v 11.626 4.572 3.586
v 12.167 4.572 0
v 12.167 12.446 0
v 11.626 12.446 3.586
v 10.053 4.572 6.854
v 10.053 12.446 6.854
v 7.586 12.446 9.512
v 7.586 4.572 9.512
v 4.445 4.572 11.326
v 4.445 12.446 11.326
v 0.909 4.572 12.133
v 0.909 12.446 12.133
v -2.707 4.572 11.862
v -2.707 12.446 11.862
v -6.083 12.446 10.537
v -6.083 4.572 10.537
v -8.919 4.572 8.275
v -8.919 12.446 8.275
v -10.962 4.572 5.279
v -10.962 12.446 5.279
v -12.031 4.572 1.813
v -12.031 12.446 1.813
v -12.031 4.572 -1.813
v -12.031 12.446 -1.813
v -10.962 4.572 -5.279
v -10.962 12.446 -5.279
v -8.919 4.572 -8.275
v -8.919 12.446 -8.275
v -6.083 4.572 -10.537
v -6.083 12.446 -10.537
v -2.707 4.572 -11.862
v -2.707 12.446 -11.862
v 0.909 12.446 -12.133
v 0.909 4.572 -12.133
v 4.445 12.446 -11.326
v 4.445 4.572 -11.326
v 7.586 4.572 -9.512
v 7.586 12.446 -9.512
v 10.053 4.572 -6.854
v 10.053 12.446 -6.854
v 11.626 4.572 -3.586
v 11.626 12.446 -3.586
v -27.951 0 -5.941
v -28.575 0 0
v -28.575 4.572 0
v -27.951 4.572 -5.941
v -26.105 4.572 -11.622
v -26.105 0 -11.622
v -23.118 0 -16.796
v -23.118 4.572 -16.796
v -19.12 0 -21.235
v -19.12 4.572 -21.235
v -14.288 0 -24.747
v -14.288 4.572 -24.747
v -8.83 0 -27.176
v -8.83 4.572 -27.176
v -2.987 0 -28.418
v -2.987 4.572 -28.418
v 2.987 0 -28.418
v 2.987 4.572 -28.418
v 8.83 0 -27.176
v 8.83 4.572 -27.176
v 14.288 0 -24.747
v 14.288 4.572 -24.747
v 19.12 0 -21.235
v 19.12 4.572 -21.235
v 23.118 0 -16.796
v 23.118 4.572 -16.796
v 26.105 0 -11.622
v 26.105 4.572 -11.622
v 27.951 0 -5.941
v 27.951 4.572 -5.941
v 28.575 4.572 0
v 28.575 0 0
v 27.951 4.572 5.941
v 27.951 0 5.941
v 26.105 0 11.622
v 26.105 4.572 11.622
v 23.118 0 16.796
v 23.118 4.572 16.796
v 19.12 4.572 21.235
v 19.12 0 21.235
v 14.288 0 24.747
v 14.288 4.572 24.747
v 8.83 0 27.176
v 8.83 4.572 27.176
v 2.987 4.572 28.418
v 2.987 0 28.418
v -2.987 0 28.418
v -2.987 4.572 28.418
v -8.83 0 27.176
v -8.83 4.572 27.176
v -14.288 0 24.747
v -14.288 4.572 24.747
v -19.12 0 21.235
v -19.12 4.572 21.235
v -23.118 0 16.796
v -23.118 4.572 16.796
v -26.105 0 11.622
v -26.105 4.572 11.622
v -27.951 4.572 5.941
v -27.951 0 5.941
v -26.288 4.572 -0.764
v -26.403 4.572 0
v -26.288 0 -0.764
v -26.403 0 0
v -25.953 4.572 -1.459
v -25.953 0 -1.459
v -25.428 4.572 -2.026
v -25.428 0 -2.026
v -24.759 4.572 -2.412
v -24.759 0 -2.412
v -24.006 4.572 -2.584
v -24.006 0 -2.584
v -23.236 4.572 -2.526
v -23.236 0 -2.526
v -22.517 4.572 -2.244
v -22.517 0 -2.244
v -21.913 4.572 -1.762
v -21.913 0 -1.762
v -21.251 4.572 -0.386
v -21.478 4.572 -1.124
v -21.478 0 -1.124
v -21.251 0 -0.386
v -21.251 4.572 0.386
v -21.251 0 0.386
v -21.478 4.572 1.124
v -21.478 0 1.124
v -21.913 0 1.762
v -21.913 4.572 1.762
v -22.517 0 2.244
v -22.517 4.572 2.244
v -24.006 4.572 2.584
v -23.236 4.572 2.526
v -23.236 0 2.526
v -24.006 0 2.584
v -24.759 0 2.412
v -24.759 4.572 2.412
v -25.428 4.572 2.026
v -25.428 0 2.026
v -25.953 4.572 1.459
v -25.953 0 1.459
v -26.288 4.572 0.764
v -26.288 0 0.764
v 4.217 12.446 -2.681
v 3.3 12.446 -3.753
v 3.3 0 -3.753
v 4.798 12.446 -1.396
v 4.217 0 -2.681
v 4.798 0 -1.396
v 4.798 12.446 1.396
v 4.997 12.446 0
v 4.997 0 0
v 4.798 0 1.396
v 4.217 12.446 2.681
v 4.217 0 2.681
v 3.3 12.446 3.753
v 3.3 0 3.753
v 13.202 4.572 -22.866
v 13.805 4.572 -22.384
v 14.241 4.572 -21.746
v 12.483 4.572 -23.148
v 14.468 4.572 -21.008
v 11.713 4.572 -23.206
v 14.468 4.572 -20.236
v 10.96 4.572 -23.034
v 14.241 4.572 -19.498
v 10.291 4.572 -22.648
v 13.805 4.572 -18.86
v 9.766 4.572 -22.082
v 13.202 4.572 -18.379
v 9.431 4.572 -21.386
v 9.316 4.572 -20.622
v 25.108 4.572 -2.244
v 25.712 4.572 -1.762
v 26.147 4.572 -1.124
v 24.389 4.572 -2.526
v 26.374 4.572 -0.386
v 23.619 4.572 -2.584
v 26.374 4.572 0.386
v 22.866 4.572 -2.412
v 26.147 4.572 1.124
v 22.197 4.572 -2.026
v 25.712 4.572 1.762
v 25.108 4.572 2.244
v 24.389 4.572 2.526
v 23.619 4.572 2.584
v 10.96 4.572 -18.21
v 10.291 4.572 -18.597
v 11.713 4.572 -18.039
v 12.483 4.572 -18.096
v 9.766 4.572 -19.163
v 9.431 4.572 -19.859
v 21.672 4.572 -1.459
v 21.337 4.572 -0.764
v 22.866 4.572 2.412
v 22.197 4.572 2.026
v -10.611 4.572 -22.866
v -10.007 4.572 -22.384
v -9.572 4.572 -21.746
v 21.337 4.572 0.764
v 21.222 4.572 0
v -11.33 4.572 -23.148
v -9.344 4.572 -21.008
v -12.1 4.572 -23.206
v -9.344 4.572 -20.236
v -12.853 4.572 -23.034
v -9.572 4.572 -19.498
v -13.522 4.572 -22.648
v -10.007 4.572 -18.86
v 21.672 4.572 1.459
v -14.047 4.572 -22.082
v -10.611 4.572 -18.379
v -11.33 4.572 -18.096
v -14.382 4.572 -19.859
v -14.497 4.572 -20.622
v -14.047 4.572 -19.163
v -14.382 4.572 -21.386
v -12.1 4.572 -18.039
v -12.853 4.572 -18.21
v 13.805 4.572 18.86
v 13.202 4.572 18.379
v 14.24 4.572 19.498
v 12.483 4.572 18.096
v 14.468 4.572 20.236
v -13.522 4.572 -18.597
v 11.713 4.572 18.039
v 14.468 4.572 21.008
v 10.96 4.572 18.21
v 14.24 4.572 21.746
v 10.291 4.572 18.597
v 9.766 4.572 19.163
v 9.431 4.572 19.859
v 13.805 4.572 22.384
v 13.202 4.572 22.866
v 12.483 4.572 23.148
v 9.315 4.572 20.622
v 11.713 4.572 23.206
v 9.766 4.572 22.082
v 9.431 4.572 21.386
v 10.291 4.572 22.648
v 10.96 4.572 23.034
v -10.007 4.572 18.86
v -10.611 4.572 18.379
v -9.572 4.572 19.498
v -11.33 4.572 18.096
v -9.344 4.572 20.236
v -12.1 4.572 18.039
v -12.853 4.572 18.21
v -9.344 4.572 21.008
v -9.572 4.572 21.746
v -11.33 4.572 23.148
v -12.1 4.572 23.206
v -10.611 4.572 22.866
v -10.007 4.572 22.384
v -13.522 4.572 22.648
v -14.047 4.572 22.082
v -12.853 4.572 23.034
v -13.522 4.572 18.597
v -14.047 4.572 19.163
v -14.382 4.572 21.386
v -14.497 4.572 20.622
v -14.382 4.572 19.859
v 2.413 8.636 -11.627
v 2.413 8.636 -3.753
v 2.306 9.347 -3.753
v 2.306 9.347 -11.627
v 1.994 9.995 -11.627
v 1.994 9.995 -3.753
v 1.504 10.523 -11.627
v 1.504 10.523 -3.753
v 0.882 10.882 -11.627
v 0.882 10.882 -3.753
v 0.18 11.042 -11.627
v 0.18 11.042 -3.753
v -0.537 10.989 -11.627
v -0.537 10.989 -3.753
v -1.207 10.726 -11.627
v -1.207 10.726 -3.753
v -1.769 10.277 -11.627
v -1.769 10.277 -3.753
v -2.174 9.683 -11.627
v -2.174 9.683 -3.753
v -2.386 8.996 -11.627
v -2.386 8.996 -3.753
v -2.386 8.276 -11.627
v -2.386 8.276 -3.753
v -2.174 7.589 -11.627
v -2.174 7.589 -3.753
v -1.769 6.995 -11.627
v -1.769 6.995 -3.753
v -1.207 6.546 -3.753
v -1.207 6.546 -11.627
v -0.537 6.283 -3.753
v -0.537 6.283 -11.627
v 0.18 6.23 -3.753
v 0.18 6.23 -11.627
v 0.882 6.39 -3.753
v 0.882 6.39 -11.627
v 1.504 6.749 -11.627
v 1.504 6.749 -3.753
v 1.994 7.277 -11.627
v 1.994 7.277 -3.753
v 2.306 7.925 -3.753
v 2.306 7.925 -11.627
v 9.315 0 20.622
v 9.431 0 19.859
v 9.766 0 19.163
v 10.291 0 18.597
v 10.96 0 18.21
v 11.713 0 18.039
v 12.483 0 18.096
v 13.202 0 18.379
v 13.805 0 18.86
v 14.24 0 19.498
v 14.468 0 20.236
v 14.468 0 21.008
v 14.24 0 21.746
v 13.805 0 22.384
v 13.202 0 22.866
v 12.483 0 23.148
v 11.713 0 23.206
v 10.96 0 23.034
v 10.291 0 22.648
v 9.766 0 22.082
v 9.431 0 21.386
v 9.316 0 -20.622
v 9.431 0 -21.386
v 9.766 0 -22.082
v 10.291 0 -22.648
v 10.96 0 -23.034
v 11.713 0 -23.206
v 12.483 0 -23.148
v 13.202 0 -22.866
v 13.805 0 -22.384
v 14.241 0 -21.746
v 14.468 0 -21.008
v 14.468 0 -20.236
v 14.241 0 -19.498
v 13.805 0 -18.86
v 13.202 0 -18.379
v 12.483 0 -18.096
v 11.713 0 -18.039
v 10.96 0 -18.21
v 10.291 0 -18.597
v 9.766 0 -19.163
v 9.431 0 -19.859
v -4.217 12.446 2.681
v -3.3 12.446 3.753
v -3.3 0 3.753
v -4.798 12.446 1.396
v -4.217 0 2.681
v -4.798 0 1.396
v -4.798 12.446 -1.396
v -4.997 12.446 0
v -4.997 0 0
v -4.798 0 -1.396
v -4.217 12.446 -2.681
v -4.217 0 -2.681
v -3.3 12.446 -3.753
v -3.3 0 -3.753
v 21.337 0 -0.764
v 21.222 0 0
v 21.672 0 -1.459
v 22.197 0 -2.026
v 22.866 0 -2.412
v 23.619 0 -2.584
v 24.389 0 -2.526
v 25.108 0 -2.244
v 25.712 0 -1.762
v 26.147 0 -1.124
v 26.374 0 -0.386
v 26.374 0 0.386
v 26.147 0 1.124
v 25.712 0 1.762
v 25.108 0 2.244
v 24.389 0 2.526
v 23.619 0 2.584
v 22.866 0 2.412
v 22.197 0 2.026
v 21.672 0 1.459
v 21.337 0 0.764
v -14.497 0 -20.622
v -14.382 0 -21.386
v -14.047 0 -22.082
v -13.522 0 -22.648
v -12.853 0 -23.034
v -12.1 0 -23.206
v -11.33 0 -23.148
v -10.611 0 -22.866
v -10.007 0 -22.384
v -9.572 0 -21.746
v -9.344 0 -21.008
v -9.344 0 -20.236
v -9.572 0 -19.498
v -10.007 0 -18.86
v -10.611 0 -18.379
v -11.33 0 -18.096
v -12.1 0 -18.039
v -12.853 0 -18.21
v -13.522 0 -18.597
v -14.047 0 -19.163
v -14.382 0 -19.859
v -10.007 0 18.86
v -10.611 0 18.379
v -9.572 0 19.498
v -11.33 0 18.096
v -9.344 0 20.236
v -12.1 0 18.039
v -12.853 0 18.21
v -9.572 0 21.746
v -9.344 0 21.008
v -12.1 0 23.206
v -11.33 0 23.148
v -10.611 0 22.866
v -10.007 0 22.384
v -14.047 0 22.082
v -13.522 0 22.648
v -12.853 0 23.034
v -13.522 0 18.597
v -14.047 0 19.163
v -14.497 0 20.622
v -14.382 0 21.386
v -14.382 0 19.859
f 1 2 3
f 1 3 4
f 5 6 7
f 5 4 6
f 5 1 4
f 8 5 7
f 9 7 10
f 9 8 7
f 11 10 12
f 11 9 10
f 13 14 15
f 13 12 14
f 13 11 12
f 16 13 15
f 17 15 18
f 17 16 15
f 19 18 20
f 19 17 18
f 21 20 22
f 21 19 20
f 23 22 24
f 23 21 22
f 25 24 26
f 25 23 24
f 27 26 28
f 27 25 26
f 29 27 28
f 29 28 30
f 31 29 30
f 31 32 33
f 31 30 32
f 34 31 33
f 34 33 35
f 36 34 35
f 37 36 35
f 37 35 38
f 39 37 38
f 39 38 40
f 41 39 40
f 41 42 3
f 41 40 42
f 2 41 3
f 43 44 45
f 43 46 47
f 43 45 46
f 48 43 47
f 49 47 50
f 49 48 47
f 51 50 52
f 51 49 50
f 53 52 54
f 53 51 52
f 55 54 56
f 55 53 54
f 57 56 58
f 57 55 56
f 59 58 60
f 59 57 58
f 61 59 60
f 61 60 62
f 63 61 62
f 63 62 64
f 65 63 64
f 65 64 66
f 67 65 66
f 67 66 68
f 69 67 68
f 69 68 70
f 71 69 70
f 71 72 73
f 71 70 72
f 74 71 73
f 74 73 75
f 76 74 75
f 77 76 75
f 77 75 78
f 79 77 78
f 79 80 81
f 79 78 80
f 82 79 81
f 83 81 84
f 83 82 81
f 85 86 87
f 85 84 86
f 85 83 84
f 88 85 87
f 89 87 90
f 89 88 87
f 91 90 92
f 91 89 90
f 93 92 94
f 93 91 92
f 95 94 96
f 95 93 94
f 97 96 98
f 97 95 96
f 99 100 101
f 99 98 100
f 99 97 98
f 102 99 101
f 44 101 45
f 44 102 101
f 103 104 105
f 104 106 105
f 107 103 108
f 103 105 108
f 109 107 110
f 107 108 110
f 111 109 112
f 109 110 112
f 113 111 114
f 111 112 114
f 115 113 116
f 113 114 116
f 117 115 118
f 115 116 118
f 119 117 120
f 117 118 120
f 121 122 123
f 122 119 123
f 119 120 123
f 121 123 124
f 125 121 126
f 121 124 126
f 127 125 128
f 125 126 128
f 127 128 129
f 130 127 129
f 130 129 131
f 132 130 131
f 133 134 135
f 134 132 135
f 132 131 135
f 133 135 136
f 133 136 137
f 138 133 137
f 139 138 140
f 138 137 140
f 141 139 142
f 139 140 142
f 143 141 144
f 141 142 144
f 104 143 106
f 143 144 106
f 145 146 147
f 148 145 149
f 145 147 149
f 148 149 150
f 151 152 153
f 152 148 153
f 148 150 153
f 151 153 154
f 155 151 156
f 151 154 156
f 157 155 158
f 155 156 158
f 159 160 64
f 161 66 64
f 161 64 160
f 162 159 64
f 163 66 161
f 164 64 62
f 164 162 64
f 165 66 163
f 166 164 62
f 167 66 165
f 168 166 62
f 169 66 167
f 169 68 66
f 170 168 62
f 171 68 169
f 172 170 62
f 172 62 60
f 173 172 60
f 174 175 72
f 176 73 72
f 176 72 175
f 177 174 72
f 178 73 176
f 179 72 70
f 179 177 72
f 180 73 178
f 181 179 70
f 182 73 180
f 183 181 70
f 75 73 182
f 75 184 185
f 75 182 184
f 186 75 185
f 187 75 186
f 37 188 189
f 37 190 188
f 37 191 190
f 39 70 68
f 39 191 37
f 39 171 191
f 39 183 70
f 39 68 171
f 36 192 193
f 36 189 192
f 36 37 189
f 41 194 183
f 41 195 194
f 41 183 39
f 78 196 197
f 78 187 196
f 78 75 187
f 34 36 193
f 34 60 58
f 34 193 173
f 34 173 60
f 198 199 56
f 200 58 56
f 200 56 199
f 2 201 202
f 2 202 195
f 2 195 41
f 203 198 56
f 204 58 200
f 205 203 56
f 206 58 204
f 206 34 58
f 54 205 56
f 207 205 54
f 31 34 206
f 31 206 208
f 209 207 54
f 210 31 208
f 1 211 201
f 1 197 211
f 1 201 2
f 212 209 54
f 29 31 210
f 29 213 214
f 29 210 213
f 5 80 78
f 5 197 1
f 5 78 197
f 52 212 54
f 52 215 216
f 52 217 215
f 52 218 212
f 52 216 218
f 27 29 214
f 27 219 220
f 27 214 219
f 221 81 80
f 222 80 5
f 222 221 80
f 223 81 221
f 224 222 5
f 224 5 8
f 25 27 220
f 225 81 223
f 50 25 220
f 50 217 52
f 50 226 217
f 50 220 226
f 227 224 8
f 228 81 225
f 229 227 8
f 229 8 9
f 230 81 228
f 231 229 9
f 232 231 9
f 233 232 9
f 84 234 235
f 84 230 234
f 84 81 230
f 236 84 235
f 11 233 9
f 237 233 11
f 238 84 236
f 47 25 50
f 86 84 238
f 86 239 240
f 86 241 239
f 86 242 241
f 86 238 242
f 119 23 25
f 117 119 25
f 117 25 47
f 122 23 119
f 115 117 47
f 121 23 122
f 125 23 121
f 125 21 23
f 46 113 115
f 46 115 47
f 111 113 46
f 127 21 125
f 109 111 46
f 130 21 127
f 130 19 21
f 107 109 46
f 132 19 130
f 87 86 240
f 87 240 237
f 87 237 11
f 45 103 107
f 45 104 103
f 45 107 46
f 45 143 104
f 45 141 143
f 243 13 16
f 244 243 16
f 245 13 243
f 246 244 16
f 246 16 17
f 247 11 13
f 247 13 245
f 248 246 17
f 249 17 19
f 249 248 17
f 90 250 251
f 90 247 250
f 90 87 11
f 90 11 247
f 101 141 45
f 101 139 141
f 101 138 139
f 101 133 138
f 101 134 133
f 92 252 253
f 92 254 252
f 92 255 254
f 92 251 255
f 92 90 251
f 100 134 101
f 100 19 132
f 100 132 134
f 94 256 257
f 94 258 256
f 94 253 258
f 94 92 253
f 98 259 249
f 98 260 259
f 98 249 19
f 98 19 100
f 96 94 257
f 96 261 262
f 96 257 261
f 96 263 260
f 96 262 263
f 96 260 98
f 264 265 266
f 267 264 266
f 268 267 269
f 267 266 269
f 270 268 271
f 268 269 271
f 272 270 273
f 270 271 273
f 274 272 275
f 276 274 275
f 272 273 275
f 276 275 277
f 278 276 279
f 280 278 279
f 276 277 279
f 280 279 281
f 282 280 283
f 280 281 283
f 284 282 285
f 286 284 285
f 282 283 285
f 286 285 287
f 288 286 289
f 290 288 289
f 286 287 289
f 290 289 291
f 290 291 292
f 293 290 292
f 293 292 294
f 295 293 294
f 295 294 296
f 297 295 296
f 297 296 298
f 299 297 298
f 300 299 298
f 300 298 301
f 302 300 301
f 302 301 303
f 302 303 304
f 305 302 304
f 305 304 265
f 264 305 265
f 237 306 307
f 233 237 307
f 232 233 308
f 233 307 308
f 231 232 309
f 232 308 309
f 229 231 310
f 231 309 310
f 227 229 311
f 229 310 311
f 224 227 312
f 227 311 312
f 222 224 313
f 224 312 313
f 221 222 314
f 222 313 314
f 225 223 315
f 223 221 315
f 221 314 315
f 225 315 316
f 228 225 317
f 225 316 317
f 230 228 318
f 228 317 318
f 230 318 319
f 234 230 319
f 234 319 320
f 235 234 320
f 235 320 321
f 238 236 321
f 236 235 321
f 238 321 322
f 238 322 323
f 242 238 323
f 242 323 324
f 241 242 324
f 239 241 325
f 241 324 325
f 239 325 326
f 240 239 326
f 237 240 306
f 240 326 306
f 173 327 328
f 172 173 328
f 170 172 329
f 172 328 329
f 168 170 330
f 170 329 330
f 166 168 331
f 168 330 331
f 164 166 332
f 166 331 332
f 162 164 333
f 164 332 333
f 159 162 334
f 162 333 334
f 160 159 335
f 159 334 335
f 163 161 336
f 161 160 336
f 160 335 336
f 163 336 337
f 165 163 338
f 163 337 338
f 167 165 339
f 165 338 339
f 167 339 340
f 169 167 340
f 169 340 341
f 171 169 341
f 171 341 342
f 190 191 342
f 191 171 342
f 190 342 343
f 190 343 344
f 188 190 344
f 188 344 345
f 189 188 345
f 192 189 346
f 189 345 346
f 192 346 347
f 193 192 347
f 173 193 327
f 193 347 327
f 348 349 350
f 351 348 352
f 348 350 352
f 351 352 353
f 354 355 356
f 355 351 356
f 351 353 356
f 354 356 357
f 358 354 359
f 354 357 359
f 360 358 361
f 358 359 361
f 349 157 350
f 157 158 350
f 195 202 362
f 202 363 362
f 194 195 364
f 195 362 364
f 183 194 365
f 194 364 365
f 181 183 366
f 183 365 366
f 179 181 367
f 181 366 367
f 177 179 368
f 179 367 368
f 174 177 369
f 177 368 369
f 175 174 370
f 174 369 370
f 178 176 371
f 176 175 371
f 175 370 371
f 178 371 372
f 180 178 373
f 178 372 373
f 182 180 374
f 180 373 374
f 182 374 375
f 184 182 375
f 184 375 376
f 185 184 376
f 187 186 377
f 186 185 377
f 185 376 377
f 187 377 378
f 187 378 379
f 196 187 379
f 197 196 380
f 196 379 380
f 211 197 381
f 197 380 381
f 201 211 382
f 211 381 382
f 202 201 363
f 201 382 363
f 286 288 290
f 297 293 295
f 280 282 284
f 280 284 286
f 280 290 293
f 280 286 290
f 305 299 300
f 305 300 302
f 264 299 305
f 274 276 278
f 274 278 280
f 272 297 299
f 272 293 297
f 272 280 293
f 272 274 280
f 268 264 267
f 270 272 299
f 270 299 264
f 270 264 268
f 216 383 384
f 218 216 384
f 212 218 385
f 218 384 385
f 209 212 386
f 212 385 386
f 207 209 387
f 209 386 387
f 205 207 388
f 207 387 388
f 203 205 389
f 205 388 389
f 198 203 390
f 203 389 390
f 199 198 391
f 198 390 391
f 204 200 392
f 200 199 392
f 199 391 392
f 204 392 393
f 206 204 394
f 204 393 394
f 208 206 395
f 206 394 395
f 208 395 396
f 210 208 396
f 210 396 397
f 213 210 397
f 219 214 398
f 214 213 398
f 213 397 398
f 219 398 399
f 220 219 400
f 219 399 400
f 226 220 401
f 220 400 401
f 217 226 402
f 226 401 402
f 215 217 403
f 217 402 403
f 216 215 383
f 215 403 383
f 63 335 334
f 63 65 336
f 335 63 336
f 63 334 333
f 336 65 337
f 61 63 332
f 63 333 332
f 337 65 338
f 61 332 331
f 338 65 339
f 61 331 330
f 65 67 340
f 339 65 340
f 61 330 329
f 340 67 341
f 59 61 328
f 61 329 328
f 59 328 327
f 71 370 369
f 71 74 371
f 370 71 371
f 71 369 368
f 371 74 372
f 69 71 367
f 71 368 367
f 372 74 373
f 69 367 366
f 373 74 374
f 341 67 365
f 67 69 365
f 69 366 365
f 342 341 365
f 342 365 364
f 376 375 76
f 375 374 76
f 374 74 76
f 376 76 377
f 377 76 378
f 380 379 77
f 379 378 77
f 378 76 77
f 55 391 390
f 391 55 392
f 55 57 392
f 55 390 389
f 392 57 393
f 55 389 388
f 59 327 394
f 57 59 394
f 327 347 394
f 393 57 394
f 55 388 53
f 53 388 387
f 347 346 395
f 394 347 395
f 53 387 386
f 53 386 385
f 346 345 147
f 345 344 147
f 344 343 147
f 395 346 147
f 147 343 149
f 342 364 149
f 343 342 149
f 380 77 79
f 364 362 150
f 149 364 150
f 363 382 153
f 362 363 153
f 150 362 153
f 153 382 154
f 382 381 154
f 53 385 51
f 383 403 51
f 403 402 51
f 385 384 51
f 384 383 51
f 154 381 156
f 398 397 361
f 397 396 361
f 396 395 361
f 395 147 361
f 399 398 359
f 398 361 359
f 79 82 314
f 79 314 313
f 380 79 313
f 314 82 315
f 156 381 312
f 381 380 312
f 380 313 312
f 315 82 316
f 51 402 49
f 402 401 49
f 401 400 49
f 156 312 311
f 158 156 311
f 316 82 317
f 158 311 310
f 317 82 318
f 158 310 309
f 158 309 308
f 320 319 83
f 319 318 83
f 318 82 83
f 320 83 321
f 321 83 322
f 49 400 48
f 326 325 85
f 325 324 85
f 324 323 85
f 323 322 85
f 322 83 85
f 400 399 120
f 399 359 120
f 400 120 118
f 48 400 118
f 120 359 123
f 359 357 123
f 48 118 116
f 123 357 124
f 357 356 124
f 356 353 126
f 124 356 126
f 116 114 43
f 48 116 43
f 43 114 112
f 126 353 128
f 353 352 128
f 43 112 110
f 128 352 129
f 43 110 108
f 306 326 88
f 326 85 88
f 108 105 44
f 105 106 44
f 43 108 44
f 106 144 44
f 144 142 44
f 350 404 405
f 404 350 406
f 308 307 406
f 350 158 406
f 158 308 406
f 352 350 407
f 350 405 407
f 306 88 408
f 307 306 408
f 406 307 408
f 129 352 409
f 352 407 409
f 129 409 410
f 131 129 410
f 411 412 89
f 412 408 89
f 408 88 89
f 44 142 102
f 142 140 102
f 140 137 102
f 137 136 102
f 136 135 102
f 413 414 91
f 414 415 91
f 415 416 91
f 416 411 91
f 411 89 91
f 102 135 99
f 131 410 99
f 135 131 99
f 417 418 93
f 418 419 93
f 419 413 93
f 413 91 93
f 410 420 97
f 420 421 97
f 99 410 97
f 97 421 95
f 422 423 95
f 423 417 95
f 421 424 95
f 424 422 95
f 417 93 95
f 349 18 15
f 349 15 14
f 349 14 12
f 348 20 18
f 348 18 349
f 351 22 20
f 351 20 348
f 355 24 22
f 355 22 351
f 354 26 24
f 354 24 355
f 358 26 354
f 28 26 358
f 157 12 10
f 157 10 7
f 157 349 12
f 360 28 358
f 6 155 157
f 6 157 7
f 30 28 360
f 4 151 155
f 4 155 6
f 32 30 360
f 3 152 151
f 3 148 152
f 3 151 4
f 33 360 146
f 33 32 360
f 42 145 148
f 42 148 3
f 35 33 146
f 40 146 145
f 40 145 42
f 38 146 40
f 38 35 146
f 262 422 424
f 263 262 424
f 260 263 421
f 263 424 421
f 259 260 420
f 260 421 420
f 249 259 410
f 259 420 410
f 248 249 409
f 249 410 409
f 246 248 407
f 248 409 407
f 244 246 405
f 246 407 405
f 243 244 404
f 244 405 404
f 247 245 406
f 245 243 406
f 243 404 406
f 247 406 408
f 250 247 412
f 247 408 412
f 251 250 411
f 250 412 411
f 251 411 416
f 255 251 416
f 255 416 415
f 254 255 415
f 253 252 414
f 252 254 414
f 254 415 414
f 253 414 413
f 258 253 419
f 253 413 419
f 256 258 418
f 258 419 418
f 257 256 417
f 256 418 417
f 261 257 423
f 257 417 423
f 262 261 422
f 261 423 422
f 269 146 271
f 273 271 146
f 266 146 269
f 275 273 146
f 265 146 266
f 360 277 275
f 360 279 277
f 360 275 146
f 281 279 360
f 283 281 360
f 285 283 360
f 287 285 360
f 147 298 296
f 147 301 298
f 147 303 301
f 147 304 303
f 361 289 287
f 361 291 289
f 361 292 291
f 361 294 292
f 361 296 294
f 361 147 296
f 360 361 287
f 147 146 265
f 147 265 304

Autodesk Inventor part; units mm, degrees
ref_plane "YZ Plane" through (0, 0, 0) normal (1, 0, 0) x (0, 1, 0)
ref_plane "XZ Plane" through (0, 0, 0) normal (0, 1, 0) x (-1, 0, 0)
ref_plane "XY Plane" through (0, 0, 0) normal (0, 0, 1) x (1, 0, 0)
sketch "Sketch1" plane through (0, 0, 0) normal (0, 1, 0) x (-1, 0, 0)
  circle A0 centre (0, 0) radius 28.575
  circle A1 centre (0, 0) radius 23.8125 construction
  circle A2 centre (23.8125, 0) radius 2.5908
  circle A3 centre (0, 0) radius 28.575
  circle A4 centre (11.9063, 20.6222) radius 2.5908
  circle A5 centre (0, 0) radius 28.575
  circle A6 centre (-11.9062, 20.6222) radius 2.5908
  circle A7 centre (0, 0) radius 28.575
  circle A8 centre (-23.8125, 0) radius 2.5908
  circle A9 centre (0, 0) radius 28.575
  circle A10 centre (-11.9063, -20.6222) radius 2.5908
  circle A11 centre (0, 0) radius 28.575
  circle A12 centre (11.9062, -20.6222) radius 2.5908
  line L0 (-3.3001, 3.7528) -> (3.3001, 3.7528)
  line L1 (-3.3001, -3.7528) -> (3.3001, -3.7528)
  arc A13 (-3.3001, 3.7528) -> (-3.3001, -3.7528) centre (0, 0) ccw
  arc A14 (3.3001, -3.7528) -> (3.3001, 3.7528) centre (0, 0) ccw
  dimension "d1" = 47.625
  dimension "d0" = 57.15
  dimension "d2" = 5.1816
  dimension "d5" = 360
  dimension "d8" = 7.5057
  dimension "d9" = 3.7529
extrude "Extrusion1" add sketch "Sketch1" along normal blind 4.572
sketch "Sketch2" plane through (0, 4.572, 0) normal (0, 1, 0) x (1, 0, 0)
  arc A0 (-3.3001, 3.7528) -> (-3.3001, -3.7528) centre (0, 0) ccw projected
  line L0 (-3.3001, 3.7528) -> (3.3001, 3.7528) projected
  arc A1 (3.3001, -3.7528) -> (3.3001, 3.7528) centre (0, 0) ccw projected
  line L1 (3.3001, -3.7528) -> (-3.3001, -3.7528) projected
  circle A2 centre (0, 0) radius 28.575 projected
  circle A3 centre (0, 0) radius 12.1666
  dimension "d12" = 24.3332
extrude "Extrusion2" add sketch "Sketch2" along normal blind 7.874 contours A3
sketch "Sketch3" plane through (-3.3001, 0, -3.7528) normal (0, 0, 1) x (1, 0, 0)
  line L0 (6.6002, 0) -> (6.6002, 12.446) projected
  line L1 (0, 12.446) -> (6.6002, 12.446) projected
  circle A0 centre (3.3001, 8.636) radius 2.413
  point P0 (3.3001, 0)
  dimension "d16" = 4.826
  dimension "d17" = 3.81
  dimension "d18" = 3.3001
extrude "Extrusion3" cut sketch "Sketch3" against normal blind 7.874
equation "\"d9\" = 0.5 * d8"
properties part number "Snow Blower Hub" material "Aluminum 6061"
